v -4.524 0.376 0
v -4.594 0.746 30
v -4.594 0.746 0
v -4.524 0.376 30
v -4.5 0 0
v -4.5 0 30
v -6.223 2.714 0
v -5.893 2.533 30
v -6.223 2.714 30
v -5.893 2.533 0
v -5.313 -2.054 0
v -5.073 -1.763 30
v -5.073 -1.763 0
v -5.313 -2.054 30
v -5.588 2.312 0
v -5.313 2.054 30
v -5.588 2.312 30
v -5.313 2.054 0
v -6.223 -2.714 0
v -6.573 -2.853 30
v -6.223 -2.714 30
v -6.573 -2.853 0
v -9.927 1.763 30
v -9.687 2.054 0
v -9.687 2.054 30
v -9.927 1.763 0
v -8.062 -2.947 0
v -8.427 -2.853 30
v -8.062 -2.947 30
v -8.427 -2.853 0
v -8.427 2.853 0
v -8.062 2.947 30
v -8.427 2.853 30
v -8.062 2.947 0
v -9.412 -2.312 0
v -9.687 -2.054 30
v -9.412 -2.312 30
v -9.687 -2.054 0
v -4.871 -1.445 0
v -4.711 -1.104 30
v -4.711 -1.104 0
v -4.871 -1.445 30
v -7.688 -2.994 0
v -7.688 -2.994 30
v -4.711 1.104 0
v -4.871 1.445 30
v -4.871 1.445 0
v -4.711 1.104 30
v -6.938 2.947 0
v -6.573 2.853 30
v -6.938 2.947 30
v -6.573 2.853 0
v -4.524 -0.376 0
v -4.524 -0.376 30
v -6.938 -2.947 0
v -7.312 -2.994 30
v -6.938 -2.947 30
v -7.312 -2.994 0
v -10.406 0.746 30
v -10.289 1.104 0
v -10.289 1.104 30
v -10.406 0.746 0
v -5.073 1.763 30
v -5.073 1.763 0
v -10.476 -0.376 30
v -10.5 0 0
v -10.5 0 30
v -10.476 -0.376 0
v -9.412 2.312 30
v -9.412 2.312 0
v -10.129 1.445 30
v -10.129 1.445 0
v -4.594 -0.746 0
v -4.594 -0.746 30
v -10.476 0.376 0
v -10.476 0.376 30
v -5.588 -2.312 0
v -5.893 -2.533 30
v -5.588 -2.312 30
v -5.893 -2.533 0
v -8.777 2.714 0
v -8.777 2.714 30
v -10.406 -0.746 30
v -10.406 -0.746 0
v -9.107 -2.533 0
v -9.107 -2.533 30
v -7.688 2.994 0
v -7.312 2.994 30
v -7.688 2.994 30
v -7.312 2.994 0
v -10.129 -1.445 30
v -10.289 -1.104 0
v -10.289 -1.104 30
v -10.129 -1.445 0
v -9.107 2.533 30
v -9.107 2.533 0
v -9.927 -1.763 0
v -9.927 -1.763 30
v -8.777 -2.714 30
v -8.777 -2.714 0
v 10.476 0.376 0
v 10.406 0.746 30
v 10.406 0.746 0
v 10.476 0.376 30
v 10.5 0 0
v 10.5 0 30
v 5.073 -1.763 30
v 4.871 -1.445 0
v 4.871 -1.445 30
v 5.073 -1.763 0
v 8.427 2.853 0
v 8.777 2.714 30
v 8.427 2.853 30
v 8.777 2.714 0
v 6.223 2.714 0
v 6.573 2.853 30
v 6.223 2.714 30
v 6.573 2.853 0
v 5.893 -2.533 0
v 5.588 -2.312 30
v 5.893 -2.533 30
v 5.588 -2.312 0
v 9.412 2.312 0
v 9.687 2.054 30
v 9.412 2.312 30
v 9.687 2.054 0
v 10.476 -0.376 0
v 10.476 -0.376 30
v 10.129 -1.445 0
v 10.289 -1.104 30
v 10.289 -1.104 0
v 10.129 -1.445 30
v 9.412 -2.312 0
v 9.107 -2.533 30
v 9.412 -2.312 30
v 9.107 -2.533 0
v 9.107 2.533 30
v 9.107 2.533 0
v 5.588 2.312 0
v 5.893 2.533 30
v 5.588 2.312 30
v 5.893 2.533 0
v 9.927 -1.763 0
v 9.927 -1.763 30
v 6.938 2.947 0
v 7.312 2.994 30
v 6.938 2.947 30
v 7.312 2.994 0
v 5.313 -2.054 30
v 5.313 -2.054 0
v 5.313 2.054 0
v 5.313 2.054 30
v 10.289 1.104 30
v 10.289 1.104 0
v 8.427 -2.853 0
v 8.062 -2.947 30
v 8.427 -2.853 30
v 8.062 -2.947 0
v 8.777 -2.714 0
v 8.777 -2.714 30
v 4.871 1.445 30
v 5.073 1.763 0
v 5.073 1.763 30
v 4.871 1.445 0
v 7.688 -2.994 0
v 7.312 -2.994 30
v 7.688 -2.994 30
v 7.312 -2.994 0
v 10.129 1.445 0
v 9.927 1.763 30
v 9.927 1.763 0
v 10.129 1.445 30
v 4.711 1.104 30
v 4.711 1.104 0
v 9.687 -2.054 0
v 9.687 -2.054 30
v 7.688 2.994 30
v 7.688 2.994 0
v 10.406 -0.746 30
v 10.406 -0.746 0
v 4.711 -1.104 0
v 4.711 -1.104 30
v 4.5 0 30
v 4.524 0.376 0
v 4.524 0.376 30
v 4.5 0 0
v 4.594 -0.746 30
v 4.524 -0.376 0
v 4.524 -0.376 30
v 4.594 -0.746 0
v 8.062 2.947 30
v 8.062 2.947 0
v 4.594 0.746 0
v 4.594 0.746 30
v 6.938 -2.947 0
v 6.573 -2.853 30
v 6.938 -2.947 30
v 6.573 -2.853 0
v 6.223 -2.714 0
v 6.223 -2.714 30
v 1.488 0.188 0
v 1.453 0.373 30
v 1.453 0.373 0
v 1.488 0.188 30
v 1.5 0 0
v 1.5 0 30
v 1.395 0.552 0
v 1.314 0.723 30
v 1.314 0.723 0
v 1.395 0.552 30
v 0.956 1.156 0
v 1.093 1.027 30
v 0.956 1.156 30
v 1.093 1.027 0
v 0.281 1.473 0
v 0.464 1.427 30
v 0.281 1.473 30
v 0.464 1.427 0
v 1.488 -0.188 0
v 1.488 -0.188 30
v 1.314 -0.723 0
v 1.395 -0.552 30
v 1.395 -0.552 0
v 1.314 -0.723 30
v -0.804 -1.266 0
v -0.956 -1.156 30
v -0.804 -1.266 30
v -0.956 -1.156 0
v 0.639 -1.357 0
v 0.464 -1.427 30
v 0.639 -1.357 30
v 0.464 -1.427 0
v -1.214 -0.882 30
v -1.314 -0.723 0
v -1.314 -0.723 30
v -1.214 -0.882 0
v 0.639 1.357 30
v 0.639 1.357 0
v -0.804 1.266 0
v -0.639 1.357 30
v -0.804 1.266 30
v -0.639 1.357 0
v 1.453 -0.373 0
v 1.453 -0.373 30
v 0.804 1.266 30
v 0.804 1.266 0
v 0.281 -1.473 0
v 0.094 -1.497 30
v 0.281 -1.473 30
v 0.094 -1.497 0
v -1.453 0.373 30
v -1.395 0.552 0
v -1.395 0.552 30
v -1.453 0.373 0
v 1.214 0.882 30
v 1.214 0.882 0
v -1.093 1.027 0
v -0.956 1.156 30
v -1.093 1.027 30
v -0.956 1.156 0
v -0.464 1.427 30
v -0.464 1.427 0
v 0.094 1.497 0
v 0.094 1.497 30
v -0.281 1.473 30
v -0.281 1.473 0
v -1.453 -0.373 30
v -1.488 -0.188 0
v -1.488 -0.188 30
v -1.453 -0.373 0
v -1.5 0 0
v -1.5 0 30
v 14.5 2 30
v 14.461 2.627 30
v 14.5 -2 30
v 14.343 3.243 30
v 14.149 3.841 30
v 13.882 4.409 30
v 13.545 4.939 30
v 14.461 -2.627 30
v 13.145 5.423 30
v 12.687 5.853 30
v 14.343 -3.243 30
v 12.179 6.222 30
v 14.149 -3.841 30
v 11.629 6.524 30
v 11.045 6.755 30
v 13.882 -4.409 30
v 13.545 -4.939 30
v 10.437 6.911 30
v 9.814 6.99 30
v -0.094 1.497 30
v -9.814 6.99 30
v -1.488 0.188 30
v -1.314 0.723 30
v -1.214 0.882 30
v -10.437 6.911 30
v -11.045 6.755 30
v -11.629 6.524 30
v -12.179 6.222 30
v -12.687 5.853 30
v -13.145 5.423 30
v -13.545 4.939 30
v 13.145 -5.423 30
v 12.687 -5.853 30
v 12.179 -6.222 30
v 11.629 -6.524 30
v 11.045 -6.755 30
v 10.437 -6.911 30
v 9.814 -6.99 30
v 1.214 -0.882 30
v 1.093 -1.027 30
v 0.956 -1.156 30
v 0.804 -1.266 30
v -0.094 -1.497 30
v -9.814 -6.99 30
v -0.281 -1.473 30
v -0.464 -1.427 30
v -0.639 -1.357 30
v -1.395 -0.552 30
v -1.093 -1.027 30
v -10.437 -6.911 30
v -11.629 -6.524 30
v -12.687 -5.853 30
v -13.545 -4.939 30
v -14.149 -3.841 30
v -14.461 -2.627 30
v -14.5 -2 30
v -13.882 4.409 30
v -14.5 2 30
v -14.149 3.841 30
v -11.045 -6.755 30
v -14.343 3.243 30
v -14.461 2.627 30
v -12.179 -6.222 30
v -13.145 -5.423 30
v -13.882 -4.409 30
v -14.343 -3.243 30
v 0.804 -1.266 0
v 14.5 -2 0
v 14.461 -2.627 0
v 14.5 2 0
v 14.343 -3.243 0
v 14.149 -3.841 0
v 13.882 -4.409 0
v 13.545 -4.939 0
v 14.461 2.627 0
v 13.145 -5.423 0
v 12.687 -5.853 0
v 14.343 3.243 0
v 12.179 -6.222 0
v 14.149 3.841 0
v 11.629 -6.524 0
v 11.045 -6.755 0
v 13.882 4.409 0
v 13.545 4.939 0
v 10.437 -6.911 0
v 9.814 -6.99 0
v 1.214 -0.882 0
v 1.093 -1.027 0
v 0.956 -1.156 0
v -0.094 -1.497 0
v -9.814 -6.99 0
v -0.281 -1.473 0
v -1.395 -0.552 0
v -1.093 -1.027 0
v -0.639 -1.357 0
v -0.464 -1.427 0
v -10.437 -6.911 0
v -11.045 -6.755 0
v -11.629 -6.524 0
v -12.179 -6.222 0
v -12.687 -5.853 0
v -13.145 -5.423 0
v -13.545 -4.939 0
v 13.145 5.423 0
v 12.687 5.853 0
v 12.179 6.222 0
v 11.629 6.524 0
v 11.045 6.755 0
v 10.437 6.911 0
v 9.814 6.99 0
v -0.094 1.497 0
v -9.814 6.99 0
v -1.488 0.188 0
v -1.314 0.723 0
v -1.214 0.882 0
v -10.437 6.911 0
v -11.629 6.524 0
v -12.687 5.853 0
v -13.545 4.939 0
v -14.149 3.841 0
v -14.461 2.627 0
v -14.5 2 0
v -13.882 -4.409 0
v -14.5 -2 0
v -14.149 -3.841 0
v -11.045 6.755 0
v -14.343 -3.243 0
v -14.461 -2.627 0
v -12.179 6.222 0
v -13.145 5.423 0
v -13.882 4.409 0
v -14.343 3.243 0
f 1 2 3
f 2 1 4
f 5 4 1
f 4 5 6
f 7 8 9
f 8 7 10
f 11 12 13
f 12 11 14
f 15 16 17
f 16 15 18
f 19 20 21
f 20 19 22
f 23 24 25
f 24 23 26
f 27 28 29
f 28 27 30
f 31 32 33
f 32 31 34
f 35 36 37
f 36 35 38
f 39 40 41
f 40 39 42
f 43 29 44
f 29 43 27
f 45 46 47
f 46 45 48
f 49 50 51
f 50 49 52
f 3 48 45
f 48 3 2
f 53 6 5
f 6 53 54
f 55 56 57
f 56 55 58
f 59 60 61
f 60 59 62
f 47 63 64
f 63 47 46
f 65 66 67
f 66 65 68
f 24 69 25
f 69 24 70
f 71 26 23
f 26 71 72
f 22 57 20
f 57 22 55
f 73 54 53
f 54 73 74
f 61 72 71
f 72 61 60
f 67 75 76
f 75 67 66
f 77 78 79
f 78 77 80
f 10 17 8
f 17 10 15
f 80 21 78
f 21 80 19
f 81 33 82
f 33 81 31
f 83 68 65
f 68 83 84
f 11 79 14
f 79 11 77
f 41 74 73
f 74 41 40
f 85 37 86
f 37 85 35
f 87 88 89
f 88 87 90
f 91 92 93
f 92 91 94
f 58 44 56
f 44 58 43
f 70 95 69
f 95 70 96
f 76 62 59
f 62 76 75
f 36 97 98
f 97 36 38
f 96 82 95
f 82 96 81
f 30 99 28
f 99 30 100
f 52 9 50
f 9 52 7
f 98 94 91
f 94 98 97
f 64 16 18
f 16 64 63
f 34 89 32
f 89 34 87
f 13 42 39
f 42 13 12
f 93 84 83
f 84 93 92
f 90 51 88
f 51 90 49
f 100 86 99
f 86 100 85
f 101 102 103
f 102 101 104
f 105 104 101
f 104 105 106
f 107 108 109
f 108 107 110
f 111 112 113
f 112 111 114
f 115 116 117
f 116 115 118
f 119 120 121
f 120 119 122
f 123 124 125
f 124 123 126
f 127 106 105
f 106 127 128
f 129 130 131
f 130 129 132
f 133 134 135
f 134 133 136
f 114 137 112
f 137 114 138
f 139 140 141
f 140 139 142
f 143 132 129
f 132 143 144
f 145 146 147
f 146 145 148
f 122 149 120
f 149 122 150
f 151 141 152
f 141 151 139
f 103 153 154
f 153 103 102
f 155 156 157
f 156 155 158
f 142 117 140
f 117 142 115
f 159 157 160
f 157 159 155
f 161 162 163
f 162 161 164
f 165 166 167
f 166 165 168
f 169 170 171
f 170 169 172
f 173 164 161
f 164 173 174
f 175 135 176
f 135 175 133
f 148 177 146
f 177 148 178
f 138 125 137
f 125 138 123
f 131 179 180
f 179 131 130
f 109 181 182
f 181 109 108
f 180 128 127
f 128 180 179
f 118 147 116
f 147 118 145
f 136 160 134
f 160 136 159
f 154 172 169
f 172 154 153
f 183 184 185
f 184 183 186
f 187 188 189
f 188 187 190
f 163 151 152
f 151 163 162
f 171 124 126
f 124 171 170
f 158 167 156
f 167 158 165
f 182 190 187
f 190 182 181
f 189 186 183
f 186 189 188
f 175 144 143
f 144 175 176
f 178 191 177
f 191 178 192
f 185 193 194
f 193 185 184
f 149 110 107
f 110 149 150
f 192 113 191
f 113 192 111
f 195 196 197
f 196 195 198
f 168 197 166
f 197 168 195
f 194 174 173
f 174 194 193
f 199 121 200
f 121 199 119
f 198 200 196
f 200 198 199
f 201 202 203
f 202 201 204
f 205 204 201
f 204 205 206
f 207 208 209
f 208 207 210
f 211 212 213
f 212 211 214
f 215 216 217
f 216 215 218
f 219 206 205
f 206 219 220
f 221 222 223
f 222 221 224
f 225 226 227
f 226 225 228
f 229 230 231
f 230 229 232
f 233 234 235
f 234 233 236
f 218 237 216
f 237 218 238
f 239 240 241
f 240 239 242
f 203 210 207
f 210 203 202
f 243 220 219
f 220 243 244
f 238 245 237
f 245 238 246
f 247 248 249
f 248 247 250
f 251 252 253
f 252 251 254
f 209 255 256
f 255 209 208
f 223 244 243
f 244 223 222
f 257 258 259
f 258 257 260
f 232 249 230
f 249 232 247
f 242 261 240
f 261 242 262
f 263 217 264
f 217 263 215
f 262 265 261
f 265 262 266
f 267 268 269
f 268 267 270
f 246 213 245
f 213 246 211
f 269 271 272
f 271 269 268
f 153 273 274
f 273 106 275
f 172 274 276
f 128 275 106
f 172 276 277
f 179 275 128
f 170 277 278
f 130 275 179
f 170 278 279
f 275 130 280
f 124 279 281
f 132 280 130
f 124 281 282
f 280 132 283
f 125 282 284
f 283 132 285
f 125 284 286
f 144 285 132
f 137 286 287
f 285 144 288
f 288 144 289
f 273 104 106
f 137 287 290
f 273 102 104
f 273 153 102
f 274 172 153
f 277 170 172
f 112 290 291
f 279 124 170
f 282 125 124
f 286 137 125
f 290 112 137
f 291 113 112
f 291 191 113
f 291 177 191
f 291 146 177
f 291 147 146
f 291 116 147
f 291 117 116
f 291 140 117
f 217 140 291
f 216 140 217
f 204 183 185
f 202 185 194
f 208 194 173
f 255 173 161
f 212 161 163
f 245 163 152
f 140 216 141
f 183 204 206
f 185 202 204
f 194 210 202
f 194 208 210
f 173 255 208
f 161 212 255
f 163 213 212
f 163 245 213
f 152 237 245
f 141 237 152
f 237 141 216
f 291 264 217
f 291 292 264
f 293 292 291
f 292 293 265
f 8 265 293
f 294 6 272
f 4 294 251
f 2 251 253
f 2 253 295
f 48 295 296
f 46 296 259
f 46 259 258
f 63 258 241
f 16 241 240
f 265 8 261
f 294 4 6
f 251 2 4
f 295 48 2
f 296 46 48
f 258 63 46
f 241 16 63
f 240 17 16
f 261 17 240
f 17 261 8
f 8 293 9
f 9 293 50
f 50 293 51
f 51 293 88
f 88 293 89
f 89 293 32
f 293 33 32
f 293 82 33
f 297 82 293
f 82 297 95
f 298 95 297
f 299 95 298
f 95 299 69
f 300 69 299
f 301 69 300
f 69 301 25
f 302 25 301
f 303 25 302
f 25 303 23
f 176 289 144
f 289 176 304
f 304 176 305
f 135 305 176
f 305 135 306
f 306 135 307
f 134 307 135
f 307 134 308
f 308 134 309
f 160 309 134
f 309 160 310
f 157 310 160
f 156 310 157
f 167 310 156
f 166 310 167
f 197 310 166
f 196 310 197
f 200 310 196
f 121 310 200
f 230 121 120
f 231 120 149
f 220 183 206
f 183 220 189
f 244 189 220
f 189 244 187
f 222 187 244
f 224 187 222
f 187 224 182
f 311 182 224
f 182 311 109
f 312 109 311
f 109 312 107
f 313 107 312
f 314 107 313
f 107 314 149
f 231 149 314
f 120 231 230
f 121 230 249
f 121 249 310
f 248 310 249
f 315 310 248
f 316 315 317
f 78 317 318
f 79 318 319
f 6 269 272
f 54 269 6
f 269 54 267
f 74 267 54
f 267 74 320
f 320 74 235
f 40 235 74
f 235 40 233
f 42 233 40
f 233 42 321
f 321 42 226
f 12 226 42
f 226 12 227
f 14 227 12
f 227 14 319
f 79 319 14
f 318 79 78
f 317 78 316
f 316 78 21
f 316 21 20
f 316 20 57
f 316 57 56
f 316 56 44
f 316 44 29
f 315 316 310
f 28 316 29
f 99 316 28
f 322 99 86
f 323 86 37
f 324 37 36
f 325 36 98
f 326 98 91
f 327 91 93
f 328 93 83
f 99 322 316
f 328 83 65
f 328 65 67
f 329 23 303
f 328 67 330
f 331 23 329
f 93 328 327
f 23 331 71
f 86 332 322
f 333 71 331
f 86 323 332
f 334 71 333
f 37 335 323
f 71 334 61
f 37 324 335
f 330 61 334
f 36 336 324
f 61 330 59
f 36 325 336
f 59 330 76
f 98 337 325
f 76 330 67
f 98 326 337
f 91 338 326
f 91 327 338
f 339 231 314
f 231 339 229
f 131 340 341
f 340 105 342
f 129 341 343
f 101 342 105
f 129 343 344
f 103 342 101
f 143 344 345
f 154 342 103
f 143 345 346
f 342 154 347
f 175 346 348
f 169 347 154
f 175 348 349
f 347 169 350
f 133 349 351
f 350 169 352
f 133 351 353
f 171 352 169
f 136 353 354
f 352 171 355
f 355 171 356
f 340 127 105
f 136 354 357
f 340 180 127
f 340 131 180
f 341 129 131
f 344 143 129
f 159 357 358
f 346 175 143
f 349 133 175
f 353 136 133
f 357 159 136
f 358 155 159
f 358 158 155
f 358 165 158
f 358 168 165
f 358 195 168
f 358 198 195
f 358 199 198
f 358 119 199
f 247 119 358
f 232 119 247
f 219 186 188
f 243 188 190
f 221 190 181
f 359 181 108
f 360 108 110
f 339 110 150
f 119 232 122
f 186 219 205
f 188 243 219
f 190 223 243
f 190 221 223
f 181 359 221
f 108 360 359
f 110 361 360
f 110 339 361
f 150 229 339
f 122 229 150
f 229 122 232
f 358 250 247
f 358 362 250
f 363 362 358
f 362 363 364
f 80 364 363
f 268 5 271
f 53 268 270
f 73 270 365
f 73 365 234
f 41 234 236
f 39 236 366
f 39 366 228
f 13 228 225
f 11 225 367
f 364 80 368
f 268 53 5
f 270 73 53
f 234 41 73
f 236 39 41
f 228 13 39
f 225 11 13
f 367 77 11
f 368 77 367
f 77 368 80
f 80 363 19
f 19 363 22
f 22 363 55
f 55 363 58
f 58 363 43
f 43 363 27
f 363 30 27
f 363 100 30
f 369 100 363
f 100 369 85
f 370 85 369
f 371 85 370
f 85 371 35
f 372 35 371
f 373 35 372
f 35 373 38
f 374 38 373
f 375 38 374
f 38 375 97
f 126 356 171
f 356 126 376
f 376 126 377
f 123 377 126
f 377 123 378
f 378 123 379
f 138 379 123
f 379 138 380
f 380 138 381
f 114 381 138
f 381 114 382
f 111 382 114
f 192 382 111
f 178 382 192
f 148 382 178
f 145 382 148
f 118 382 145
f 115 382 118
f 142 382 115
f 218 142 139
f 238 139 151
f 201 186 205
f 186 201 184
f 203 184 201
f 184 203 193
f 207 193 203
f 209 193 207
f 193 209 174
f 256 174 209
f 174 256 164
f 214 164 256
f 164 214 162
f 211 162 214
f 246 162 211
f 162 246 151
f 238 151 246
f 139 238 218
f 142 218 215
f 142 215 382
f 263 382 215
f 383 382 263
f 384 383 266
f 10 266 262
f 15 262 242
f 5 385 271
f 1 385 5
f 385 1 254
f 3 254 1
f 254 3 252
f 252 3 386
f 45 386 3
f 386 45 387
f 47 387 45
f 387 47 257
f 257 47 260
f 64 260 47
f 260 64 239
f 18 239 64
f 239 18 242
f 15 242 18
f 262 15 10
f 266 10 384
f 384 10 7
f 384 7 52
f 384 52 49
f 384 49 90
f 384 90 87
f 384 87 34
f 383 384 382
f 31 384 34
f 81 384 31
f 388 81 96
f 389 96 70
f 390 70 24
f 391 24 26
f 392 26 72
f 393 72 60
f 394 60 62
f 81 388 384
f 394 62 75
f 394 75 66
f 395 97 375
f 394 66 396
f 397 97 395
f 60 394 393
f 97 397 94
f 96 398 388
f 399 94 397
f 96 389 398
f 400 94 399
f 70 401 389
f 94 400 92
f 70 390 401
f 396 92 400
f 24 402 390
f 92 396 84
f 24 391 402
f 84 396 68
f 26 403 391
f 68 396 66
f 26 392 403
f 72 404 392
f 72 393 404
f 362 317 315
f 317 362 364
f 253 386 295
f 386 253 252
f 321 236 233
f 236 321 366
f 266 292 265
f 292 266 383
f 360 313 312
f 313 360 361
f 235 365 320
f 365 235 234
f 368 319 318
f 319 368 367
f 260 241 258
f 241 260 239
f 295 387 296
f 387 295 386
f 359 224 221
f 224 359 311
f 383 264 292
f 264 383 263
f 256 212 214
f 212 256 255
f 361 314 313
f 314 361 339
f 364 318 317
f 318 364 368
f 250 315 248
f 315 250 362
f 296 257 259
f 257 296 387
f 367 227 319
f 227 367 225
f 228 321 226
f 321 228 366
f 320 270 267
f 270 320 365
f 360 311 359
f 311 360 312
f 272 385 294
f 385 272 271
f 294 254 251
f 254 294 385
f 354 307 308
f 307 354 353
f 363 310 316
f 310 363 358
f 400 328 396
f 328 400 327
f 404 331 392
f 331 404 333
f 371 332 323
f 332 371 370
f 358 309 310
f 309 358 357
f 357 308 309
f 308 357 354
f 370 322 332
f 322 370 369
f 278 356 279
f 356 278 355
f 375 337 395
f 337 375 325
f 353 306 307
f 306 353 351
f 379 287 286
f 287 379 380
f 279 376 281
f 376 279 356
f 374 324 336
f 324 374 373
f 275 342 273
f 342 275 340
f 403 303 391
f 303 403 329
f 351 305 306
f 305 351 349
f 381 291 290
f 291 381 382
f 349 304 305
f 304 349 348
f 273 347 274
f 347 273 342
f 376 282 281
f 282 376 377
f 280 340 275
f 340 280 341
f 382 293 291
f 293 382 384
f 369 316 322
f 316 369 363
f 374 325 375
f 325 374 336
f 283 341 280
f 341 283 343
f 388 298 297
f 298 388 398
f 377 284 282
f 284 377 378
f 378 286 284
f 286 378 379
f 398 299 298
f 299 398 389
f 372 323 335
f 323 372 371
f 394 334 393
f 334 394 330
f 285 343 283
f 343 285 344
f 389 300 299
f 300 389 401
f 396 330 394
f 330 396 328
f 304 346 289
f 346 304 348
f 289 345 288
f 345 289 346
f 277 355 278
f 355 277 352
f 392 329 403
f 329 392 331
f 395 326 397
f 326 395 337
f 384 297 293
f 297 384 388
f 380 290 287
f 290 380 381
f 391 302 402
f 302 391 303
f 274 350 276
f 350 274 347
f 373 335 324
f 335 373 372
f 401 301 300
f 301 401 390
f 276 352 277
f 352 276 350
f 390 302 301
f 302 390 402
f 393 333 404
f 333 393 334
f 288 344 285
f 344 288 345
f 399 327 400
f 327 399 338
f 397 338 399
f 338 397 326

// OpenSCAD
$fn = 50;


difference() {
	union() {
		hull() {
			translate(v = [-9.5000000000, 2.0000000000, 0]) {
				cylinder(h = 30, r = 5);
			}
			translate(v = [9.5000000000, 2.0000000000, 0]) {
				cylinder(h = 30, r = 5);
			}
			translate(v = [-9.5000000000, -2.0000000000, 0]) {
				cylinder(h = 30, r = 5);
			}
			translate(v = [9.5000000000, -2.0000000000, 0]) {
				cylinder(h = 30, r = 5);
			}
		}
	}
	union() {
		translate(v = [-7.5000000000, 0.0000000000, -100.0000000000]) {
			cylinder(h = 200, r = 3.0000000000);
		}
		translate(v = [7.5000000000, 0.0000000000, -100.0000000000]) {
			cylinder(h = 200, r = 3.0000000000);
		}
		translate(v = [-7.5000000000, 0.0000000000, 0]) {
			cylinder(h = 30, r = 1.5000000000);
		}
		cylinder(h = 30, r = 1.5000000000);
		translate(v = [7.5000000000, 0.0000000000, 0]) {
			cylinder(h = 30, r = 1.5000000000);
		}
		translate(v = [-7.5000000000, 0.0000000000, 0]) {
			cylinder(h = 30, r = 1.5000000000);
		}
		cylinder(h = 30, r = 1.5000000000);
		translate(v = [7.5000000000, 0.0000000000, 0]) {
			cylinder(h = 30, r = 1.5000000000);
		}
		translate(v = [-7.5000000000, 0.0000000000, 0]) {
			cylinder(h = 30, r = 1.5000000000);
		}
		cylinder(h = 30, r = 1.5000000000);
		translate(v = [7.5000000000, 0.0000000000, 0]) {
			cylinder(h = 30, r = 1.5000000000);
		}
	}
}
